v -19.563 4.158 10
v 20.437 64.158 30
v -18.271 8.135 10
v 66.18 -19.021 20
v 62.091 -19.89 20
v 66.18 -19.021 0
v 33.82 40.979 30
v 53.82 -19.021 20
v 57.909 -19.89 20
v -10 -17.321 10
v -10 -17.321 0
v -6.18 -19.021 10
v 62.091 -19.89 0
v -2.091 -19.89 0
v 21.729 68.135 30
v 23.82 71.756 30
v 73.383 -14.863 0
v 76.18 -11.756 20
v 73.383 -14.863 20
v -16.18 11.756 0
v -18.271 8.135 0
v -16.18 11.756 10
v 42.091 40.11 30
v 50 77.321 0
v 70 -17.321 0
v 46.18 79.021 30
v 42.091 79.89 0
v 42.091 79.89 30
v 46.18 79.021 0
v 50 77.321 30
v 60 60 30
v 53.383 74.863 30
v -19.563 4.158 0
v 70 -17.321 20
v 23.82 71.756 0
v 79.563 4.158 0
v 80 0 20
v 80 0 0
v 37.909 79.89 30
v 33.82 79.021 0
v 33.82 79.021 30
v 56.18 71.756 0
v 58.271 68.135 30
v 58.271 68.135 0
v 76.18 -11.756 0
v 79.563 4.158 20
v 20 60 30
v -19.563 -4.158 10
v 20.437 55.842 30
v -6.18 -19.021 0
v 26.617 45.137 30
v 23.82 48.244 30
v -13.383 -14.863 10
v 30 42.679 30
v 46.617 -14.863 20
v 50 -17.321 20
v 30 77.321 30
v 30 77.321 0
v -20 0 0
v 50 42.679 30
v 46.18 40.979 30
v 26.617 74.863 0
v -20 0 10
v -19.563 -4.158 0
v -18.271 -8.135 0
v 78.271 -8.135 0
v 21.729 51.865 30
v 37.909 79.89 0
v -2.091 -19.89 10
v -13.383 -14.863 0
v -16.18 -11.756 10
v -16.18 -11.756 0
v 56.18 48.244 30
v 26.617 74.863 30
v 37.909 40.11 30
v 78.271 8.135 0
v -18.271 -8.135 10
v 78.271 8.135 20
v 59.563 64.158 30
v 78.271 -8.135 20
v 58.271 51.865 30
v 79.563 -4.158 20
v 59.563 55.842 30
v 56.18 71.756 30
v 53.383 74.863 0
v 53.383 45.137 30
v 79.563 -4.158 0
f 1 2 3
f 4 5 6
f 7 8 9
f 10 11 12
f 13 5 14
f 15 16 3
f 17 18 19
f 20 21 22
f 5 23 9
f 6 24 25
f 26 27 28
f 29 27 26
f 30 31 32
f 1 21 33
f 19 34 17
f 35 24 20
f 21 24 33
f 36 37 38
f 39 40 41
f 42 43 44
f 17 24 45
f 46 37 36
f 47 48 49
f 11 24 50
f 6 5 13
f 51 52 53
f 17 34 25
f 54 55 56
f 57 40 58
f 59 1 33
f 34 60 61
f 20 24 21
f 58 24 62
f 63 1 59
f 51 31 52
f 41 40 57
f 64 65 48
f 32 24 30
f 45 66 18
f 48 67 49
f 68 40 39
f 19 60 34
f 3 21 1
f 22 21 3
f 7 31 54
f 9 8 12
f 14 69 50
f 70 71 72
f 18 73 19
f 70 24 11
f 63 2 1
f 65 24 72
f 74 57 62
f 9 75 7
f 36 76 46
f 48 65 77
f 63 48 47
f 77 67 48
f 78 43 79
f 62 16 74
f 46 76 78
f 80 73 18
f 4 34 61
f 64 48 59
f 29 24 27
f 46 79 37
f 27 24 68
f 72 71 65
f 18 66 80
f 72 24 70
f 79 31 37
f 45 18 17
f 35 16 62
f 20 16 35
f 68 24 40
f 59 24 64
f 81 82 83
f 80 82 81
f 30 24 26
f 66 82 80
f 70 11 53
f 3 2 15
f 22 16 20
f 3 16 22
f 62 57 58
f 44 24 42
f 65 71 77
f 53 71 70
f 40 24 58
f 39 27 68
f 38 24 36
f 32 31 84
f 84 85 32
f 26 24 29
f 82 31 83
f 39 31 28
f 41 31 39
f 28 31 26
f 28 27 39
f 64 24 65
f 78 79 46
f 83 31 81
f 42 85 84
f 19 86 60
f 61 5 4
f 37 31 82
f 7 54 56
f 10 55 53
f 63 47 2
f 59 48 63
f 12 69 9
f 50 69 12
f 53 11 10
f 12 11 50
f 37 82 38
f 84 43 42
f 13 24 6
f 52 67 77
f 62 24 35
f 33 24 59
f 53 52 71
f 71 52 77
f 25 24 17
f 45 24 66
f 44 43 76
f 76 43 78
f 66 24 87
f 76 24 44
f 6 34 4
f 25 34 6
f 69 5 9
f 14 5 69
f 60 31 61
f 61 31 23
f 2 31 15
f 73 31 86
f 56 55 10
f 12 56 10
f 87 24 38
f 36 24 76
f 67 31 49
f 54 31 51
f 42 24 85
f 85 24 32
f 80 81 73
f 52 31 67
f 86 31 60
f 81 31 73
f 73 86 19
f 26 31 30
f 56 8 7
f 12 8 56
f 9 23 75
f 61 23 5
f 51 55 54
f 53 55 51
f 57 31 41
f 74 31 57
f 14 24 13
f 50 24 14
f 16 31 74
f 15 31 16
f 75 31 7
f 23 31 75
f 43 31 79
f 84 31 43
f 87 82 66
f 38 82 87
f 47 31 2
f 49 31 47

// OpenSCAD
module placa_snowboard(grosime,raza,lungime)
{
cylinder(h=grosime,r=raza);

    x=20;

    translate([lungime-2*raza,0,0]) cylinder(h=grosime,r=raza);
    translate([0,-raza,0])cube([lungime-2*raza,2*raza,grosime]);
}

module placa_snowboard_2(grosime,raza,lungime)
{
    hull(){
        
    cylinder(h=grosime,r=raza);

    x=20;
    translate([lungime-2*raza,0,0]) cylinder(h=grosime,r=raza);
    }   
}
//_____________________________
module placa_podium(grosime,raza,lungime)
{
    hull(){
        
    cylinder(h=grosime,r=raza);

    translate([(lungime-raza)/2,lungime-2*raza,0])cylinder(h=3*grosime,r=raza);
    translate([lungime-2*raza,0,0]) cylinder(h=2*grosime,r=raza);
    }   
}
//_____________________________
//placa_snowboard_2(grosime=10,raza=20,lungime=100);
placa_podium(grosime=10,raza=20,lungime=100);
